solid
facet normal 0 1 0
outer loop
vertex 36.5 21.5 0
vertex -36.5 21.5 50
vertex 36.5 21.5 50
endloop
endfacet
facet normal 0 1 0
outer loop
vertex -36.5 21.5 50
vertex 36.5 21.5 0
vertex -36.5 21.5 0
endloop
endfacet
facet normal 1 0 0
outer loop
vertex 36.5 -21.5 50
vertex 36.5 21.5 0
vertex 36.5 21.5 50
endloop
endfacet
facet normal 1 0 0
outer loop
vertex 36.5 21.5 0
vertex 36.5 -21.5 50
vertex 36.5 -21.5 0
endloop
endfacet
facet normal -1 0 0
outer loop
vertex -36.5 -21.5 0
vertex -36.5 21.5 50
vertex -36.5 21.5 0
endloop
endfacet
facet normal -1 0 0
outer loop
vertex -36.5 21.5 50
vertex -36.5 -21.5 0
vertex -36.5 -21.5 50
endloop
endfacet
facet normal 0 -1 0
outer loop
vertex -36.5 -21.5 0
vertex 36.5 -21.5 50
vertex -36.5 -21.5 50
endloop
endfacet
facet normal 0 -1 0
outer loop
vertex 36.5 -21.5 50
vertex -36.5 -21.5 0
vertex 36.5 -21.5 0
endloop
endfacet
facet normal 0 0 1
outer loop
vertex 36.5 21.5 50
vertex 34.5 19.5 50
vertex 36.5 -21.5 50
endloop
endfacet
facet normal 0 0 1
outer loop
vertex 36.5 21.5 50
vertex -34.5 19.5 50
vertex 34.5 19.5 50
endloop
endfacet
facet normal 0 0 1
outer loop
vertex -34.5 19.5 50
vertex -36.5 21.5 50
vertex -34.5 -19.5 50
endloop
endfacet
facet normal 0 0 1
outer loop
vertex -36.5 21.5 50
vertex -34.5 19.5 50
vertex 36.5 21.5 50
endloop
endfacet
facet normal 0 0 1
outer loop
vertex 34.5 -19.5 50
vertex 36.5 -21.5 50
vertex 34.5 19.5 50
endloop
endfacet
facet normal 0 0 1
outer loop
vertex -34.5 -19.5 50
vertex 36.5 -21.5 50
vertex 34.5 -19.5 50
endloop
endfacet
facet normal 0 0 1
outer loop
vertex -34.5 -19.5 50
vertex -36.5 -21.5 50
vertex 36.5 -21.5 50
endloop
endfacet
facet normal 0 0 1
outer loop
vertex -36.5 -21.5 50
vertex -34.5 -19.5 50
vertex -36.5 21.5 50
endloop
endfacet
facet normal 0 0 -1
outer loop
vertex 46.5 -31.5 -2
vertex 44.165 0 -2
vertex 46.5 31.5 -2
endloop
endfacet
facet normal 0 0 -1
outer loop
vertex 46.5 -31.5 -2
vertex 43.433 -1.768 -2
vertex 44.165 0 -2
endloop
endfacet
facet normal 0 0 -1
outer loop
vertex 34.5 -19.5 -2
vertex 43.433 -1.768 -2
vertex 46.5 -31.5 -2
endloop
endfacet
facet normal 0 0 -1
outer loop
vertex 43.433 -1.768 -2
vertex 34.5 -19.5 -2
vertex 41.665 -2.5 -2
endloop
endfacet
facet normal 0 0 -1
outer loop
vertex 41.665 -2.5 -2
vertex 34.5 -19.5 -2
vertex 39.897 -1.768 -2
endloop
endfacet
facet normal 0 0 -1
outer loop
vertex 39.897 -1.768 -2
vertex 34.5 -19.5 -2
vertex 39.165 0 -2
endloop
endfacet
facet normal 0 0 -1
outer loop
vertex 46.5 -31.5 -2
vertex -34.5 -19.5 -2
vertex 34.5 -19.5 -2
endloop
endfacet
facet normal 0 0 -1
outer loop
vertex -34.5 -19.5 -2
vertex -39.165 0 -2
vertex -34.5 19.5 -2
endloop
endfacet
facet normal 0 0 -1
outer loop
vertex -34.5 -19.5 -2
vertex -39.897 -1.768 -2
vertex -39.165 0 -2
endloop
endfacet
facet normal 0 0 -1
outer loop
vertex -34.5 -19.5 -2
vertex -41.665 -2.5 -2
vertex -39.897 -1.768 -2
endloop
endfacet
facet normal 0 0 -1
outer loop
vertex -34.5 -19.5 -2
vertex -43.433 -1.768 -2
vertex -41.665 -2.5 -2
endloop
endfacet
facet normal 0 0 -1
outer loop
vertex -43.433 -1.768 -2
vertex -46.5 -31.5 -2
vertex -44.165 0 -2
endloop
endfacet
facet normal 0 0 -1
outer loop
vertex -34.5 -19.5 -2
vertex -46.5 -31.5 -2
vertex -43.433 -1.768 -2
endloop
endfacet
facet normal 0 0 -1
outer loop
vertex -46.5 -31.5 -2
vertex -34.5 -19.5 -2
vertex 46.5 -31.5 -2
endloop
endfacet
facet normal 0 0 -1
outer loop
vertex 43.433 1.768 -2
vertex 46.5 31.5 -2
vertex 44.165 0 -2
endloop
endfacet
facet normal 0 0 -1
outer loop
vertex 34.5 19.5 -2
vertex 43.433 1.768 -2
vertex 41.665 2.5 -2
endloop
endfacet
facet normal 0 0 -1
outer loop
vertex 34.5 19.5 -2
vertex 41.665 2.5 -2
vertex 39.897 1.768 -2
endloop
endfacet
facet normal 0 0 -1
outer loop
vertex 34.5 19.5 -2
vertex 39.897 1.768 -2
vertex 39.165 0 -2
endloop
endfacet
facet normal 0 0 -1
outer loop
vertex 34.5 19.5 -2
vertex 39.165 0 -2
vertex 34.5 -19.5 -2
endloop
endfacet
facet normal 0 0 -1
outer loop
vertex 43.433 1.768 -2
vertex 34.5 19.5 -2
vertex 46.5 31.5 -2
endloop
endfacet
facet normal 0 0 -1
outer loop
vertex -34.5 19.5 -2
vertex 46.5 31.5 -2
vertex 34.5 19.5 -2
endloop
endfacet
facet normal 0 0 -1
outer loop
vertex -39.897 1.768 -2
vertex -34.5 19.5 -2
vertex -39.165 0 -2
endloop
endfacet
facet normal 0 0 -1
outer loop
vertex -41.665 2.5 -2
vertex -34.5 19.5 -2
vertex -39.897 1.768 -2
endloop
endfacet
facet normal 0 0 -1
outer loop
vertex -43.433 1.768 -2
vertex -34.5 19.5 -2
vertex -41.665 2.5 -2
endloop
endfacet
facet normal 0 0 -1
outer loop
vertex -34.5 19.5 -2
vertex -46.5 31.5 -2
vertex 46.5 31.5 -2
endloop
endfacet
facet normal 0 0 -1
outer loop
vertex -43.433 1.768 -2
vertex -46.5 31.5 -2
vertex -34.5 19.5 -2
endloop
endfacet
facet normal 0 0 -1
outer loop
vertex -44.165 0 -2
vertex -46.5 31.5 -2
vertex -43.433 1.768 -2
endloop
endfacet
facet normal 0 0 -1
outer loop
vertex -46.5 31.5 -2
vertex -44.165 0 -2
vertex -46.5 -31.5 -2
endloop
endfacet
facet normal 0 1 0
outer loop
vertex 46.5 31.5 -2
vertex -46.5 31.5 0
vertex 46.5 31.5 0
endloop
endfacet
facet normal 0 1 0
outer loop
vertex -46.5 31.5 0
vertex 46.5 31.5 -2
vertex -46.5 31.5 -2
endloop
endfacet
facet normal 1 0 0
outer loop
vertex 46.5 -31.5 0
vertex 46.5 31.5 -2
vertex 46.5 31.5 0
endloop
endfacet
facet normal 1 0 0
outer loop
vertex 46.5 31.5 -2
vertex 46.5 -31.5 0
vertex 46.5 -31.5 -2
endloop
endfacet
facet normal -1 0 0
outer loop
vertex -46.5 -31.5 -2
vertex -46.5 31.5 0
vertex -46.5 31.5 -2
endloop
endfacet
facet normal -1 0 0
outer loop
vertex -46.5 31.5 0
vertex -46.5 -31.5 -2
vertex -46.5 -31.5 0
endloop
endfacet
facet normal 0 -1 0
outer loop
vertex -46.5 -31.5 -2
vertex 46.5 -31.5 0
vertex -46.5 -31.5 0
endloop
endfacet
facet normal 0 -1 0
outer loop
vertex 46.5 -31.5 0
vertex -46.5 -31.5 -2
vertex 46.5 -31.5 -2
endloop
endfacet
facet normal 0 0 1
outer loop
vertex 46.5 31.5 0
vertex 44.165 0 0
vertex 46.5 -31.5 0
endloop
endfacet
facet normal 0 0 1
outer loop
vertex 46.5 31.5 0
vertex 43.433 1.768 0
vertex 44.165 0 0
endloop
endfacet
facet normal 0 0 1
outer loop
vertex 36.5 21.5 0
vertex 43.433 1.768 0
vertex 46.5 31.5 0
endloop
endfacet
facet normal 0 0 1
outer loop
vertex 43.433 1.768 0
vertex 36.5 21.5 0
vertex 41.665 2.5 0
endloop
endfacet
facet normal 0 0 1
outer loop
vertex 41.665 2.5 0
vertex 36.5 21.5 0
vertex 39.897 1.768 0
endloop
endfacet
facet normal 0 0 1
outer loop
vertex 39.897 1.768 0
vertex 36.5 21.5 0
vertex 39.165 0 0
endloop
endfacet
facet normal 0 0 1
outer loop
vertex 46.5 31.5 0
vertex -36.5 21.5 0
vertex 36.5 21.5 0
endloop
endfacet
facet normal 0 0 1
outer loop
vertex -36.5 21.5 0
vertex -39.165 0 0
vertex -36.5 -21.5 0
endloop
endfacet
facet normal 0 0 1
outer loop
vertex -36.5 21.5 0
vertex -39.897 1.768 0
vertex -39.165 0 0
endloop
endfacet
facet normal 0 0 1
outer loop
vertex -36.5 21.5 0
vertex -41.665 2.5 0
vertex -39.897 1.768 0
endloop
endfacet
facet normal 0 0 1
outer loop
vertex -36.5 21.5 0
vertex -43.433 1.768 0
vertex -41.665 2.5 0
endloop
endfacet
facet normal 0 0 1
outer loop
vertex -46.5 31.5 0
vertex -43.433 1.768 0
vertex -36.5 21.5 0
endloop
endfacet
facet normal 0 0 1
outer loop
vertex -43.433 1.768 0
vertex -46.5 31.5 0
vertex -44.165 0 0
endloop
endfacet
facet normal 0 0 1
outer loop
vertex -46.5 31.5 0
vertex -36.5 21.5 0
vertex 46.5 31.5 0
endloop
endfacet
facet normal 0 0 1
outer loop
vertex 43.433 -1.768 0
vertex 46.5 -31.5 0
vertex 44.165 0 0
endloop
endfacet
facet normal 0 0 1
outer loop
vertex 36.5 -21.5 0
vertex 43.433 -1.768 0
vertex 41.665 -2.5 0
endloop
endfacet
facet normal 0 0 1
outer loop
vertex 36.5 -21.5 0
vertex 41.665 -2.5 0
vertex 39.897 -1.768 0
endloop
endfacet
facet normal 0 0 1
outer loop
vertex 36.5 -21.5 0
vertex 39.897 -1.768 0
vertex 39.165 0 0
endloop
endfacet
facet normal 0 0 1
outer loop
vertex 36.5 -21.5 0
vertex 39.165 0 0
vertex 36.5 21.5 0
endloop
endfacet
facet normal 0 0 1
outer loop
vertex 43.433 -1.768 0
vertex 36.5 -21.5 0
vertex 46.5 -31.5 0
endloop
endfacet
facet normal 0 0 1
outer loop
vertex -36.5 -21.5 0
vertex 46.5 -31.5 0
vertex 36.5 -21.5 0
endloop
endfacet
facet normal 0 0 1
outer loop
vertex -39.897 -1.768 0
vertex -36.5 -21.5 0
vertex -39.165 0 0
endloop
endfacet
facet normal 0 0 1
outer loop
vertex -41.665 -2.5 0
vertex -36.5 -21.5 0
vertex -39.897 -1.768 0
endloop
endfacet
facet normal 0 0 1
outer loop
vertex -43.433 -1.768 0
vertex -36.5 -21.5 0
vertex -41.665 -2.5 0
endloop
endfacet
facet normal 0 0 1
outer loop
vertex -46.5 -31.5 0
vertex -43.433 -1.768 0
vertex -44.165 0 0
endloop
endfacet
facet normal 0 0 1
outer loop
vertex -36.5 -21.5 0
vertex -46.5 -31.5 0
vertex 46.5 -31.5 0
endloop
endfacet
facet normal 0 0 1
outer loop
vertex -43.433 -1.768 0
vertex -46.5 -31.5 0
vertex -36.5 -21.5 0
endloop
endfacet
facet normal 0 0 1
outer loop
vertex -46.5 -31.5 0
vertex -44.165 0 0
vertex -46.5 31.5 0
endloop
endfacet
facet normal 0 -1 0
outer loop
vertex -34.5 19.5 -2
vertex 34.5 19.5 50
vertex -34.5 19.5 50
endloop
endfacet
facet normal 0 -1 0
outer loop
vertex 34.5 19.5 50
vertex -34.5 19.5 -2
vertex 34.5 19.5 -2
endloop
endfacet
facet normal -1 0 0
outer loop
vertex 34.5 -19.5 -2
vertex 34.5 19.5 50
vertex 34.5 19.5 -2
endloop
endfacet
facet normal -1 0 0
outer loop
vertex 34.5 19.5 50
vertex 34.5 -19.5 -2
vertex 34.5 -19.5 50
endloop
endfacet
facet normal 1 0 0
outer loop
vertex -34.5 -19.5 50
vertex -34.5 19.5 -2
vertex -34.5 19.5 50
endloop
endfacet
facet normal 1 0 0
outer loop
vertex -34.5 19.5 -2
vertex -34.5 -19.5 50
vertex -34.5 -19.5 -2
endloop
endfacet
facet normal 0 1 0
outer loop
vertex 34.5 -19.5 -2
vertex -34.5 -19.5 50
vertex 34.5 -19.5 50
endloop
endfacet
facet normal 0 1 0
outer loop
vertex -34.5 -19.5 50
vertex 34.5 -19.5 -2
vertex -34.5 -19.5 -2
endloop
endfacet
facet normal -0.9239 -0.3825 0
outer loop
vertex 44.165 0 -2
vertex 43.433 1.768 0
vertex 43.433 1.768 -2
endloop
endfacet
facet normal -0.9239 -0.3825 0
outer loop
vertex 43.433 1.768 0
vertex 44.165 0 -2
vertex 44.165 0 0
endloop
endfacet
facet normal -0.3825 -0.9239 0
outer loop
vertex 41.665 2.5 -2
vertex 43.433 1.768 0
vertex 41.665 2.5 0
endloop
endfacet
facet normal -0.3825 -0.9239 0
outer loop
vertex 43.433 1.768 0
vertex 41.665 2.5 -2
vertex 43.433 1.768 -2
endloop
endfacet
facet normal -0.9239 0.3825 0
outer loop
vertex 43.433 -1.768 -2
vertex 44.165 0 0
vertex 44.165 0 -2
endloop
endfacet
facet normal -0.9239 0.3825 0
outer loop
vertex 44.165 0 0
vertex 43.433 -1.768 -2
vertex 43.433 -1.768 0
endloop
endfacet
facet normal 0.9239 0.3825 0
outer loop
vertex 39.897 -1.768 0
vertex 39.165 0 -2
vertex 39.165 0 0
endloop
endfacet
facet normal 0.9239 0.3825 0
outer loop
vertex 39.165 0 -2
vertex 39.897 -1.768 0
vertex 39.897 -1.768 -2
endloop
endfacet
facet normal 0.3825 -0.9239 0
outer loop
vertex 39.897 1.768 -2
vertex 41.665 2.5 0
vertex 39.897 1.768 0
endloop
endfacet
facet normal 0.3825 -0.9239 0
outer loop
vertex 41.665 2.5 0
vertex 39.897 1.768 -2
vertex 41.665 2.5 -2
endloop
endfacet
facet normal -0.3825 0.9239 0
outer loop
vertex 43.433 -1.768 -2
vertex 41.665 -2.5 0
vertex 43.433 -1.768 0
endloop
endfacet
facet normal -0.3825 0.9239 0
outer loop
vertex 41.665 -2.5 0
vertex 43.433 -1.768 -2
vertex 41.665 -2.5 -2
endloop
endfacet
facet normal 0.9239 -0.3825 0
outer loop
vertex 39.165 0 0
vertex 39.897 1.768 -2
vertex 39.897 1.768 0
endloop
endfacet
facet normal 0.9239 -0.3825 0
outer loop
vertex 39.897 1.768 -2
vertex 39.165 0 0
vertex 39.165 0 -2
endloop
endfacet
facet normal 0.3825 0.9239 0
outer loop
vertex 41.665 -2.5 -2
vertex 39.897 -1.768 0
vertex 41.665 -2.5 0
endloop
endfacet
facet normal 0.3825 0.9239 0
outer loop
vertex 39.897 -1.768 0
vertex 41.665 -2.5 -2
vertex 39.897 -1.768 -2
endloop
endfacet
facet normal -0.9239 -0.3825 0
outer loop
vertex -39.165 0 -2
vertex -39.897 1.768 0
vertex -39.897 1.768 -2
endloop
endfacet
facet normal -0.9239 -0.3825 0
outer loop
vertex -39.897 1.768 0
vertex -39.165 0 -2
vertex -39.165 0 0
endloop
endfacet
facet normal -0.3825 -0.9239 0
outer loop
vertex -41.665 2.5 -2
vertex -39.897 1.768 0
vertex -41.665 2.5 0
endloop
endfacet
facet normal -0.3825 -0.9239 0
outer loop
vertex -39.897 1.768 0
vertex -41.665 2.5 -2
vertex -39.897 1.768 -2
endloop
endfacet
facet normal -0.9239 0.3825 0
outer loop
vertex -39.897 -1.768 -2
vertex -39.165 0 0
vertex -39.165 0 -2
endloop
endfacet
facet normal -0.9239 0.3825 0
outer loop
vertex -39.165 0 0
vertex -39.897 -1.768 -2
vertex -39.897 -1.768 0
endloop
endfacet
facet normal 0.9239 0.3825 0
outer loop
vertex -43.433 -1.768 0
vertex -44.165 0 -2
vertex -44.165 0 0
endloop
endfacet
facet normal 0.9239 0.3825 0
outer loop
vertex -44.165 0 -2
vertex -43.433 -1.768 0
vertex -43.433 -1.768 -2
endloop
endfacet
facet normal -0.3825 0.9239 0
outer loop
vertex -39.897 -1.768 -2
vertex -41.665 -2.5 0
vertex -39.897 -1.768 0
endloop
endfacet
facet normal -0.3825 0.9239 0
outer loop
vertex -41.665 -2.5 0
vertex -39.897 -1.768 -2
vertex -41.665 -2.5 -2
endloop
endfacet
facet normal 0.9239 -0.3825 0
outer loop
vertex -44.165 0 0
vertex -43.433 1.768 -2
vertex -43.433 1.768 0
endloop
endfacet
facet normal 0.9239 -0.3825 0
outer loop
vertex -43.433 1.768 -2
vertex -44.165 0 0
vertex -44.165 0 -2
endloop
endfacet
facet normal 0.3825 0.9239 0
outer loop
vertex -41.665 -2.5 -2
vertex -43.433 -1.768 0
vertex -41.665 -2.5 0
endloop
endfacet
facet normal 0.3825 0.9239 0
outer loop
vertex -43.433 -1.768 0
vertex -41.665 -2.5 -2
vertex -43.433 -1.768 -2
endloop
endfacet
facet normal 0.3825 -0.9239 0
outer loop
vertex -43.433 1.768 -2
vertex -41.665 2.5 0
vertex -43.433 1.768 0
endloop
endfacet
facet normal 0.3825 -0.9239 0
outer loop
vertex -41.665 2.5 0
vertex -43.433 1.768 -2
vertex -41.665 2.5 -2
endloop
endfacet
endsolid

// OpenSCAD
// measurements in millimeters
height=73; // outer body height
width=43; // outer body width
depth=50;
thickness=2;
boxMount=83.33;
hole=5; // diameter
lip=10;

translate([-height/2,-width/2,-thickness]) rotate([90,0,90])
difference() {
    // body
    union() {
        cube([width,depth+thickness,height]);
        
        // lip
translate([-lip, 0, -lip]) cube([width+2*lip, thickness, height+2*lip]);
    }
    
    // interior
    translate([thickness, -thickness, thickness]) cube([width-2*thickness,depth+3*thickness,height-2*thickness]);
    
    // box mount through-holes
translate([width/2, 1.5*thickness, boxMount/2+height/2]) rotate([90,0,0]) cylinder(thickness*2, hole/2, hole/2);
translate([width/2, 1.5*thickness, -boxMount/2+height/2]) rotate([90,0,0]) cylinder(thickness*2, hole/2, hole/2);
    
}
